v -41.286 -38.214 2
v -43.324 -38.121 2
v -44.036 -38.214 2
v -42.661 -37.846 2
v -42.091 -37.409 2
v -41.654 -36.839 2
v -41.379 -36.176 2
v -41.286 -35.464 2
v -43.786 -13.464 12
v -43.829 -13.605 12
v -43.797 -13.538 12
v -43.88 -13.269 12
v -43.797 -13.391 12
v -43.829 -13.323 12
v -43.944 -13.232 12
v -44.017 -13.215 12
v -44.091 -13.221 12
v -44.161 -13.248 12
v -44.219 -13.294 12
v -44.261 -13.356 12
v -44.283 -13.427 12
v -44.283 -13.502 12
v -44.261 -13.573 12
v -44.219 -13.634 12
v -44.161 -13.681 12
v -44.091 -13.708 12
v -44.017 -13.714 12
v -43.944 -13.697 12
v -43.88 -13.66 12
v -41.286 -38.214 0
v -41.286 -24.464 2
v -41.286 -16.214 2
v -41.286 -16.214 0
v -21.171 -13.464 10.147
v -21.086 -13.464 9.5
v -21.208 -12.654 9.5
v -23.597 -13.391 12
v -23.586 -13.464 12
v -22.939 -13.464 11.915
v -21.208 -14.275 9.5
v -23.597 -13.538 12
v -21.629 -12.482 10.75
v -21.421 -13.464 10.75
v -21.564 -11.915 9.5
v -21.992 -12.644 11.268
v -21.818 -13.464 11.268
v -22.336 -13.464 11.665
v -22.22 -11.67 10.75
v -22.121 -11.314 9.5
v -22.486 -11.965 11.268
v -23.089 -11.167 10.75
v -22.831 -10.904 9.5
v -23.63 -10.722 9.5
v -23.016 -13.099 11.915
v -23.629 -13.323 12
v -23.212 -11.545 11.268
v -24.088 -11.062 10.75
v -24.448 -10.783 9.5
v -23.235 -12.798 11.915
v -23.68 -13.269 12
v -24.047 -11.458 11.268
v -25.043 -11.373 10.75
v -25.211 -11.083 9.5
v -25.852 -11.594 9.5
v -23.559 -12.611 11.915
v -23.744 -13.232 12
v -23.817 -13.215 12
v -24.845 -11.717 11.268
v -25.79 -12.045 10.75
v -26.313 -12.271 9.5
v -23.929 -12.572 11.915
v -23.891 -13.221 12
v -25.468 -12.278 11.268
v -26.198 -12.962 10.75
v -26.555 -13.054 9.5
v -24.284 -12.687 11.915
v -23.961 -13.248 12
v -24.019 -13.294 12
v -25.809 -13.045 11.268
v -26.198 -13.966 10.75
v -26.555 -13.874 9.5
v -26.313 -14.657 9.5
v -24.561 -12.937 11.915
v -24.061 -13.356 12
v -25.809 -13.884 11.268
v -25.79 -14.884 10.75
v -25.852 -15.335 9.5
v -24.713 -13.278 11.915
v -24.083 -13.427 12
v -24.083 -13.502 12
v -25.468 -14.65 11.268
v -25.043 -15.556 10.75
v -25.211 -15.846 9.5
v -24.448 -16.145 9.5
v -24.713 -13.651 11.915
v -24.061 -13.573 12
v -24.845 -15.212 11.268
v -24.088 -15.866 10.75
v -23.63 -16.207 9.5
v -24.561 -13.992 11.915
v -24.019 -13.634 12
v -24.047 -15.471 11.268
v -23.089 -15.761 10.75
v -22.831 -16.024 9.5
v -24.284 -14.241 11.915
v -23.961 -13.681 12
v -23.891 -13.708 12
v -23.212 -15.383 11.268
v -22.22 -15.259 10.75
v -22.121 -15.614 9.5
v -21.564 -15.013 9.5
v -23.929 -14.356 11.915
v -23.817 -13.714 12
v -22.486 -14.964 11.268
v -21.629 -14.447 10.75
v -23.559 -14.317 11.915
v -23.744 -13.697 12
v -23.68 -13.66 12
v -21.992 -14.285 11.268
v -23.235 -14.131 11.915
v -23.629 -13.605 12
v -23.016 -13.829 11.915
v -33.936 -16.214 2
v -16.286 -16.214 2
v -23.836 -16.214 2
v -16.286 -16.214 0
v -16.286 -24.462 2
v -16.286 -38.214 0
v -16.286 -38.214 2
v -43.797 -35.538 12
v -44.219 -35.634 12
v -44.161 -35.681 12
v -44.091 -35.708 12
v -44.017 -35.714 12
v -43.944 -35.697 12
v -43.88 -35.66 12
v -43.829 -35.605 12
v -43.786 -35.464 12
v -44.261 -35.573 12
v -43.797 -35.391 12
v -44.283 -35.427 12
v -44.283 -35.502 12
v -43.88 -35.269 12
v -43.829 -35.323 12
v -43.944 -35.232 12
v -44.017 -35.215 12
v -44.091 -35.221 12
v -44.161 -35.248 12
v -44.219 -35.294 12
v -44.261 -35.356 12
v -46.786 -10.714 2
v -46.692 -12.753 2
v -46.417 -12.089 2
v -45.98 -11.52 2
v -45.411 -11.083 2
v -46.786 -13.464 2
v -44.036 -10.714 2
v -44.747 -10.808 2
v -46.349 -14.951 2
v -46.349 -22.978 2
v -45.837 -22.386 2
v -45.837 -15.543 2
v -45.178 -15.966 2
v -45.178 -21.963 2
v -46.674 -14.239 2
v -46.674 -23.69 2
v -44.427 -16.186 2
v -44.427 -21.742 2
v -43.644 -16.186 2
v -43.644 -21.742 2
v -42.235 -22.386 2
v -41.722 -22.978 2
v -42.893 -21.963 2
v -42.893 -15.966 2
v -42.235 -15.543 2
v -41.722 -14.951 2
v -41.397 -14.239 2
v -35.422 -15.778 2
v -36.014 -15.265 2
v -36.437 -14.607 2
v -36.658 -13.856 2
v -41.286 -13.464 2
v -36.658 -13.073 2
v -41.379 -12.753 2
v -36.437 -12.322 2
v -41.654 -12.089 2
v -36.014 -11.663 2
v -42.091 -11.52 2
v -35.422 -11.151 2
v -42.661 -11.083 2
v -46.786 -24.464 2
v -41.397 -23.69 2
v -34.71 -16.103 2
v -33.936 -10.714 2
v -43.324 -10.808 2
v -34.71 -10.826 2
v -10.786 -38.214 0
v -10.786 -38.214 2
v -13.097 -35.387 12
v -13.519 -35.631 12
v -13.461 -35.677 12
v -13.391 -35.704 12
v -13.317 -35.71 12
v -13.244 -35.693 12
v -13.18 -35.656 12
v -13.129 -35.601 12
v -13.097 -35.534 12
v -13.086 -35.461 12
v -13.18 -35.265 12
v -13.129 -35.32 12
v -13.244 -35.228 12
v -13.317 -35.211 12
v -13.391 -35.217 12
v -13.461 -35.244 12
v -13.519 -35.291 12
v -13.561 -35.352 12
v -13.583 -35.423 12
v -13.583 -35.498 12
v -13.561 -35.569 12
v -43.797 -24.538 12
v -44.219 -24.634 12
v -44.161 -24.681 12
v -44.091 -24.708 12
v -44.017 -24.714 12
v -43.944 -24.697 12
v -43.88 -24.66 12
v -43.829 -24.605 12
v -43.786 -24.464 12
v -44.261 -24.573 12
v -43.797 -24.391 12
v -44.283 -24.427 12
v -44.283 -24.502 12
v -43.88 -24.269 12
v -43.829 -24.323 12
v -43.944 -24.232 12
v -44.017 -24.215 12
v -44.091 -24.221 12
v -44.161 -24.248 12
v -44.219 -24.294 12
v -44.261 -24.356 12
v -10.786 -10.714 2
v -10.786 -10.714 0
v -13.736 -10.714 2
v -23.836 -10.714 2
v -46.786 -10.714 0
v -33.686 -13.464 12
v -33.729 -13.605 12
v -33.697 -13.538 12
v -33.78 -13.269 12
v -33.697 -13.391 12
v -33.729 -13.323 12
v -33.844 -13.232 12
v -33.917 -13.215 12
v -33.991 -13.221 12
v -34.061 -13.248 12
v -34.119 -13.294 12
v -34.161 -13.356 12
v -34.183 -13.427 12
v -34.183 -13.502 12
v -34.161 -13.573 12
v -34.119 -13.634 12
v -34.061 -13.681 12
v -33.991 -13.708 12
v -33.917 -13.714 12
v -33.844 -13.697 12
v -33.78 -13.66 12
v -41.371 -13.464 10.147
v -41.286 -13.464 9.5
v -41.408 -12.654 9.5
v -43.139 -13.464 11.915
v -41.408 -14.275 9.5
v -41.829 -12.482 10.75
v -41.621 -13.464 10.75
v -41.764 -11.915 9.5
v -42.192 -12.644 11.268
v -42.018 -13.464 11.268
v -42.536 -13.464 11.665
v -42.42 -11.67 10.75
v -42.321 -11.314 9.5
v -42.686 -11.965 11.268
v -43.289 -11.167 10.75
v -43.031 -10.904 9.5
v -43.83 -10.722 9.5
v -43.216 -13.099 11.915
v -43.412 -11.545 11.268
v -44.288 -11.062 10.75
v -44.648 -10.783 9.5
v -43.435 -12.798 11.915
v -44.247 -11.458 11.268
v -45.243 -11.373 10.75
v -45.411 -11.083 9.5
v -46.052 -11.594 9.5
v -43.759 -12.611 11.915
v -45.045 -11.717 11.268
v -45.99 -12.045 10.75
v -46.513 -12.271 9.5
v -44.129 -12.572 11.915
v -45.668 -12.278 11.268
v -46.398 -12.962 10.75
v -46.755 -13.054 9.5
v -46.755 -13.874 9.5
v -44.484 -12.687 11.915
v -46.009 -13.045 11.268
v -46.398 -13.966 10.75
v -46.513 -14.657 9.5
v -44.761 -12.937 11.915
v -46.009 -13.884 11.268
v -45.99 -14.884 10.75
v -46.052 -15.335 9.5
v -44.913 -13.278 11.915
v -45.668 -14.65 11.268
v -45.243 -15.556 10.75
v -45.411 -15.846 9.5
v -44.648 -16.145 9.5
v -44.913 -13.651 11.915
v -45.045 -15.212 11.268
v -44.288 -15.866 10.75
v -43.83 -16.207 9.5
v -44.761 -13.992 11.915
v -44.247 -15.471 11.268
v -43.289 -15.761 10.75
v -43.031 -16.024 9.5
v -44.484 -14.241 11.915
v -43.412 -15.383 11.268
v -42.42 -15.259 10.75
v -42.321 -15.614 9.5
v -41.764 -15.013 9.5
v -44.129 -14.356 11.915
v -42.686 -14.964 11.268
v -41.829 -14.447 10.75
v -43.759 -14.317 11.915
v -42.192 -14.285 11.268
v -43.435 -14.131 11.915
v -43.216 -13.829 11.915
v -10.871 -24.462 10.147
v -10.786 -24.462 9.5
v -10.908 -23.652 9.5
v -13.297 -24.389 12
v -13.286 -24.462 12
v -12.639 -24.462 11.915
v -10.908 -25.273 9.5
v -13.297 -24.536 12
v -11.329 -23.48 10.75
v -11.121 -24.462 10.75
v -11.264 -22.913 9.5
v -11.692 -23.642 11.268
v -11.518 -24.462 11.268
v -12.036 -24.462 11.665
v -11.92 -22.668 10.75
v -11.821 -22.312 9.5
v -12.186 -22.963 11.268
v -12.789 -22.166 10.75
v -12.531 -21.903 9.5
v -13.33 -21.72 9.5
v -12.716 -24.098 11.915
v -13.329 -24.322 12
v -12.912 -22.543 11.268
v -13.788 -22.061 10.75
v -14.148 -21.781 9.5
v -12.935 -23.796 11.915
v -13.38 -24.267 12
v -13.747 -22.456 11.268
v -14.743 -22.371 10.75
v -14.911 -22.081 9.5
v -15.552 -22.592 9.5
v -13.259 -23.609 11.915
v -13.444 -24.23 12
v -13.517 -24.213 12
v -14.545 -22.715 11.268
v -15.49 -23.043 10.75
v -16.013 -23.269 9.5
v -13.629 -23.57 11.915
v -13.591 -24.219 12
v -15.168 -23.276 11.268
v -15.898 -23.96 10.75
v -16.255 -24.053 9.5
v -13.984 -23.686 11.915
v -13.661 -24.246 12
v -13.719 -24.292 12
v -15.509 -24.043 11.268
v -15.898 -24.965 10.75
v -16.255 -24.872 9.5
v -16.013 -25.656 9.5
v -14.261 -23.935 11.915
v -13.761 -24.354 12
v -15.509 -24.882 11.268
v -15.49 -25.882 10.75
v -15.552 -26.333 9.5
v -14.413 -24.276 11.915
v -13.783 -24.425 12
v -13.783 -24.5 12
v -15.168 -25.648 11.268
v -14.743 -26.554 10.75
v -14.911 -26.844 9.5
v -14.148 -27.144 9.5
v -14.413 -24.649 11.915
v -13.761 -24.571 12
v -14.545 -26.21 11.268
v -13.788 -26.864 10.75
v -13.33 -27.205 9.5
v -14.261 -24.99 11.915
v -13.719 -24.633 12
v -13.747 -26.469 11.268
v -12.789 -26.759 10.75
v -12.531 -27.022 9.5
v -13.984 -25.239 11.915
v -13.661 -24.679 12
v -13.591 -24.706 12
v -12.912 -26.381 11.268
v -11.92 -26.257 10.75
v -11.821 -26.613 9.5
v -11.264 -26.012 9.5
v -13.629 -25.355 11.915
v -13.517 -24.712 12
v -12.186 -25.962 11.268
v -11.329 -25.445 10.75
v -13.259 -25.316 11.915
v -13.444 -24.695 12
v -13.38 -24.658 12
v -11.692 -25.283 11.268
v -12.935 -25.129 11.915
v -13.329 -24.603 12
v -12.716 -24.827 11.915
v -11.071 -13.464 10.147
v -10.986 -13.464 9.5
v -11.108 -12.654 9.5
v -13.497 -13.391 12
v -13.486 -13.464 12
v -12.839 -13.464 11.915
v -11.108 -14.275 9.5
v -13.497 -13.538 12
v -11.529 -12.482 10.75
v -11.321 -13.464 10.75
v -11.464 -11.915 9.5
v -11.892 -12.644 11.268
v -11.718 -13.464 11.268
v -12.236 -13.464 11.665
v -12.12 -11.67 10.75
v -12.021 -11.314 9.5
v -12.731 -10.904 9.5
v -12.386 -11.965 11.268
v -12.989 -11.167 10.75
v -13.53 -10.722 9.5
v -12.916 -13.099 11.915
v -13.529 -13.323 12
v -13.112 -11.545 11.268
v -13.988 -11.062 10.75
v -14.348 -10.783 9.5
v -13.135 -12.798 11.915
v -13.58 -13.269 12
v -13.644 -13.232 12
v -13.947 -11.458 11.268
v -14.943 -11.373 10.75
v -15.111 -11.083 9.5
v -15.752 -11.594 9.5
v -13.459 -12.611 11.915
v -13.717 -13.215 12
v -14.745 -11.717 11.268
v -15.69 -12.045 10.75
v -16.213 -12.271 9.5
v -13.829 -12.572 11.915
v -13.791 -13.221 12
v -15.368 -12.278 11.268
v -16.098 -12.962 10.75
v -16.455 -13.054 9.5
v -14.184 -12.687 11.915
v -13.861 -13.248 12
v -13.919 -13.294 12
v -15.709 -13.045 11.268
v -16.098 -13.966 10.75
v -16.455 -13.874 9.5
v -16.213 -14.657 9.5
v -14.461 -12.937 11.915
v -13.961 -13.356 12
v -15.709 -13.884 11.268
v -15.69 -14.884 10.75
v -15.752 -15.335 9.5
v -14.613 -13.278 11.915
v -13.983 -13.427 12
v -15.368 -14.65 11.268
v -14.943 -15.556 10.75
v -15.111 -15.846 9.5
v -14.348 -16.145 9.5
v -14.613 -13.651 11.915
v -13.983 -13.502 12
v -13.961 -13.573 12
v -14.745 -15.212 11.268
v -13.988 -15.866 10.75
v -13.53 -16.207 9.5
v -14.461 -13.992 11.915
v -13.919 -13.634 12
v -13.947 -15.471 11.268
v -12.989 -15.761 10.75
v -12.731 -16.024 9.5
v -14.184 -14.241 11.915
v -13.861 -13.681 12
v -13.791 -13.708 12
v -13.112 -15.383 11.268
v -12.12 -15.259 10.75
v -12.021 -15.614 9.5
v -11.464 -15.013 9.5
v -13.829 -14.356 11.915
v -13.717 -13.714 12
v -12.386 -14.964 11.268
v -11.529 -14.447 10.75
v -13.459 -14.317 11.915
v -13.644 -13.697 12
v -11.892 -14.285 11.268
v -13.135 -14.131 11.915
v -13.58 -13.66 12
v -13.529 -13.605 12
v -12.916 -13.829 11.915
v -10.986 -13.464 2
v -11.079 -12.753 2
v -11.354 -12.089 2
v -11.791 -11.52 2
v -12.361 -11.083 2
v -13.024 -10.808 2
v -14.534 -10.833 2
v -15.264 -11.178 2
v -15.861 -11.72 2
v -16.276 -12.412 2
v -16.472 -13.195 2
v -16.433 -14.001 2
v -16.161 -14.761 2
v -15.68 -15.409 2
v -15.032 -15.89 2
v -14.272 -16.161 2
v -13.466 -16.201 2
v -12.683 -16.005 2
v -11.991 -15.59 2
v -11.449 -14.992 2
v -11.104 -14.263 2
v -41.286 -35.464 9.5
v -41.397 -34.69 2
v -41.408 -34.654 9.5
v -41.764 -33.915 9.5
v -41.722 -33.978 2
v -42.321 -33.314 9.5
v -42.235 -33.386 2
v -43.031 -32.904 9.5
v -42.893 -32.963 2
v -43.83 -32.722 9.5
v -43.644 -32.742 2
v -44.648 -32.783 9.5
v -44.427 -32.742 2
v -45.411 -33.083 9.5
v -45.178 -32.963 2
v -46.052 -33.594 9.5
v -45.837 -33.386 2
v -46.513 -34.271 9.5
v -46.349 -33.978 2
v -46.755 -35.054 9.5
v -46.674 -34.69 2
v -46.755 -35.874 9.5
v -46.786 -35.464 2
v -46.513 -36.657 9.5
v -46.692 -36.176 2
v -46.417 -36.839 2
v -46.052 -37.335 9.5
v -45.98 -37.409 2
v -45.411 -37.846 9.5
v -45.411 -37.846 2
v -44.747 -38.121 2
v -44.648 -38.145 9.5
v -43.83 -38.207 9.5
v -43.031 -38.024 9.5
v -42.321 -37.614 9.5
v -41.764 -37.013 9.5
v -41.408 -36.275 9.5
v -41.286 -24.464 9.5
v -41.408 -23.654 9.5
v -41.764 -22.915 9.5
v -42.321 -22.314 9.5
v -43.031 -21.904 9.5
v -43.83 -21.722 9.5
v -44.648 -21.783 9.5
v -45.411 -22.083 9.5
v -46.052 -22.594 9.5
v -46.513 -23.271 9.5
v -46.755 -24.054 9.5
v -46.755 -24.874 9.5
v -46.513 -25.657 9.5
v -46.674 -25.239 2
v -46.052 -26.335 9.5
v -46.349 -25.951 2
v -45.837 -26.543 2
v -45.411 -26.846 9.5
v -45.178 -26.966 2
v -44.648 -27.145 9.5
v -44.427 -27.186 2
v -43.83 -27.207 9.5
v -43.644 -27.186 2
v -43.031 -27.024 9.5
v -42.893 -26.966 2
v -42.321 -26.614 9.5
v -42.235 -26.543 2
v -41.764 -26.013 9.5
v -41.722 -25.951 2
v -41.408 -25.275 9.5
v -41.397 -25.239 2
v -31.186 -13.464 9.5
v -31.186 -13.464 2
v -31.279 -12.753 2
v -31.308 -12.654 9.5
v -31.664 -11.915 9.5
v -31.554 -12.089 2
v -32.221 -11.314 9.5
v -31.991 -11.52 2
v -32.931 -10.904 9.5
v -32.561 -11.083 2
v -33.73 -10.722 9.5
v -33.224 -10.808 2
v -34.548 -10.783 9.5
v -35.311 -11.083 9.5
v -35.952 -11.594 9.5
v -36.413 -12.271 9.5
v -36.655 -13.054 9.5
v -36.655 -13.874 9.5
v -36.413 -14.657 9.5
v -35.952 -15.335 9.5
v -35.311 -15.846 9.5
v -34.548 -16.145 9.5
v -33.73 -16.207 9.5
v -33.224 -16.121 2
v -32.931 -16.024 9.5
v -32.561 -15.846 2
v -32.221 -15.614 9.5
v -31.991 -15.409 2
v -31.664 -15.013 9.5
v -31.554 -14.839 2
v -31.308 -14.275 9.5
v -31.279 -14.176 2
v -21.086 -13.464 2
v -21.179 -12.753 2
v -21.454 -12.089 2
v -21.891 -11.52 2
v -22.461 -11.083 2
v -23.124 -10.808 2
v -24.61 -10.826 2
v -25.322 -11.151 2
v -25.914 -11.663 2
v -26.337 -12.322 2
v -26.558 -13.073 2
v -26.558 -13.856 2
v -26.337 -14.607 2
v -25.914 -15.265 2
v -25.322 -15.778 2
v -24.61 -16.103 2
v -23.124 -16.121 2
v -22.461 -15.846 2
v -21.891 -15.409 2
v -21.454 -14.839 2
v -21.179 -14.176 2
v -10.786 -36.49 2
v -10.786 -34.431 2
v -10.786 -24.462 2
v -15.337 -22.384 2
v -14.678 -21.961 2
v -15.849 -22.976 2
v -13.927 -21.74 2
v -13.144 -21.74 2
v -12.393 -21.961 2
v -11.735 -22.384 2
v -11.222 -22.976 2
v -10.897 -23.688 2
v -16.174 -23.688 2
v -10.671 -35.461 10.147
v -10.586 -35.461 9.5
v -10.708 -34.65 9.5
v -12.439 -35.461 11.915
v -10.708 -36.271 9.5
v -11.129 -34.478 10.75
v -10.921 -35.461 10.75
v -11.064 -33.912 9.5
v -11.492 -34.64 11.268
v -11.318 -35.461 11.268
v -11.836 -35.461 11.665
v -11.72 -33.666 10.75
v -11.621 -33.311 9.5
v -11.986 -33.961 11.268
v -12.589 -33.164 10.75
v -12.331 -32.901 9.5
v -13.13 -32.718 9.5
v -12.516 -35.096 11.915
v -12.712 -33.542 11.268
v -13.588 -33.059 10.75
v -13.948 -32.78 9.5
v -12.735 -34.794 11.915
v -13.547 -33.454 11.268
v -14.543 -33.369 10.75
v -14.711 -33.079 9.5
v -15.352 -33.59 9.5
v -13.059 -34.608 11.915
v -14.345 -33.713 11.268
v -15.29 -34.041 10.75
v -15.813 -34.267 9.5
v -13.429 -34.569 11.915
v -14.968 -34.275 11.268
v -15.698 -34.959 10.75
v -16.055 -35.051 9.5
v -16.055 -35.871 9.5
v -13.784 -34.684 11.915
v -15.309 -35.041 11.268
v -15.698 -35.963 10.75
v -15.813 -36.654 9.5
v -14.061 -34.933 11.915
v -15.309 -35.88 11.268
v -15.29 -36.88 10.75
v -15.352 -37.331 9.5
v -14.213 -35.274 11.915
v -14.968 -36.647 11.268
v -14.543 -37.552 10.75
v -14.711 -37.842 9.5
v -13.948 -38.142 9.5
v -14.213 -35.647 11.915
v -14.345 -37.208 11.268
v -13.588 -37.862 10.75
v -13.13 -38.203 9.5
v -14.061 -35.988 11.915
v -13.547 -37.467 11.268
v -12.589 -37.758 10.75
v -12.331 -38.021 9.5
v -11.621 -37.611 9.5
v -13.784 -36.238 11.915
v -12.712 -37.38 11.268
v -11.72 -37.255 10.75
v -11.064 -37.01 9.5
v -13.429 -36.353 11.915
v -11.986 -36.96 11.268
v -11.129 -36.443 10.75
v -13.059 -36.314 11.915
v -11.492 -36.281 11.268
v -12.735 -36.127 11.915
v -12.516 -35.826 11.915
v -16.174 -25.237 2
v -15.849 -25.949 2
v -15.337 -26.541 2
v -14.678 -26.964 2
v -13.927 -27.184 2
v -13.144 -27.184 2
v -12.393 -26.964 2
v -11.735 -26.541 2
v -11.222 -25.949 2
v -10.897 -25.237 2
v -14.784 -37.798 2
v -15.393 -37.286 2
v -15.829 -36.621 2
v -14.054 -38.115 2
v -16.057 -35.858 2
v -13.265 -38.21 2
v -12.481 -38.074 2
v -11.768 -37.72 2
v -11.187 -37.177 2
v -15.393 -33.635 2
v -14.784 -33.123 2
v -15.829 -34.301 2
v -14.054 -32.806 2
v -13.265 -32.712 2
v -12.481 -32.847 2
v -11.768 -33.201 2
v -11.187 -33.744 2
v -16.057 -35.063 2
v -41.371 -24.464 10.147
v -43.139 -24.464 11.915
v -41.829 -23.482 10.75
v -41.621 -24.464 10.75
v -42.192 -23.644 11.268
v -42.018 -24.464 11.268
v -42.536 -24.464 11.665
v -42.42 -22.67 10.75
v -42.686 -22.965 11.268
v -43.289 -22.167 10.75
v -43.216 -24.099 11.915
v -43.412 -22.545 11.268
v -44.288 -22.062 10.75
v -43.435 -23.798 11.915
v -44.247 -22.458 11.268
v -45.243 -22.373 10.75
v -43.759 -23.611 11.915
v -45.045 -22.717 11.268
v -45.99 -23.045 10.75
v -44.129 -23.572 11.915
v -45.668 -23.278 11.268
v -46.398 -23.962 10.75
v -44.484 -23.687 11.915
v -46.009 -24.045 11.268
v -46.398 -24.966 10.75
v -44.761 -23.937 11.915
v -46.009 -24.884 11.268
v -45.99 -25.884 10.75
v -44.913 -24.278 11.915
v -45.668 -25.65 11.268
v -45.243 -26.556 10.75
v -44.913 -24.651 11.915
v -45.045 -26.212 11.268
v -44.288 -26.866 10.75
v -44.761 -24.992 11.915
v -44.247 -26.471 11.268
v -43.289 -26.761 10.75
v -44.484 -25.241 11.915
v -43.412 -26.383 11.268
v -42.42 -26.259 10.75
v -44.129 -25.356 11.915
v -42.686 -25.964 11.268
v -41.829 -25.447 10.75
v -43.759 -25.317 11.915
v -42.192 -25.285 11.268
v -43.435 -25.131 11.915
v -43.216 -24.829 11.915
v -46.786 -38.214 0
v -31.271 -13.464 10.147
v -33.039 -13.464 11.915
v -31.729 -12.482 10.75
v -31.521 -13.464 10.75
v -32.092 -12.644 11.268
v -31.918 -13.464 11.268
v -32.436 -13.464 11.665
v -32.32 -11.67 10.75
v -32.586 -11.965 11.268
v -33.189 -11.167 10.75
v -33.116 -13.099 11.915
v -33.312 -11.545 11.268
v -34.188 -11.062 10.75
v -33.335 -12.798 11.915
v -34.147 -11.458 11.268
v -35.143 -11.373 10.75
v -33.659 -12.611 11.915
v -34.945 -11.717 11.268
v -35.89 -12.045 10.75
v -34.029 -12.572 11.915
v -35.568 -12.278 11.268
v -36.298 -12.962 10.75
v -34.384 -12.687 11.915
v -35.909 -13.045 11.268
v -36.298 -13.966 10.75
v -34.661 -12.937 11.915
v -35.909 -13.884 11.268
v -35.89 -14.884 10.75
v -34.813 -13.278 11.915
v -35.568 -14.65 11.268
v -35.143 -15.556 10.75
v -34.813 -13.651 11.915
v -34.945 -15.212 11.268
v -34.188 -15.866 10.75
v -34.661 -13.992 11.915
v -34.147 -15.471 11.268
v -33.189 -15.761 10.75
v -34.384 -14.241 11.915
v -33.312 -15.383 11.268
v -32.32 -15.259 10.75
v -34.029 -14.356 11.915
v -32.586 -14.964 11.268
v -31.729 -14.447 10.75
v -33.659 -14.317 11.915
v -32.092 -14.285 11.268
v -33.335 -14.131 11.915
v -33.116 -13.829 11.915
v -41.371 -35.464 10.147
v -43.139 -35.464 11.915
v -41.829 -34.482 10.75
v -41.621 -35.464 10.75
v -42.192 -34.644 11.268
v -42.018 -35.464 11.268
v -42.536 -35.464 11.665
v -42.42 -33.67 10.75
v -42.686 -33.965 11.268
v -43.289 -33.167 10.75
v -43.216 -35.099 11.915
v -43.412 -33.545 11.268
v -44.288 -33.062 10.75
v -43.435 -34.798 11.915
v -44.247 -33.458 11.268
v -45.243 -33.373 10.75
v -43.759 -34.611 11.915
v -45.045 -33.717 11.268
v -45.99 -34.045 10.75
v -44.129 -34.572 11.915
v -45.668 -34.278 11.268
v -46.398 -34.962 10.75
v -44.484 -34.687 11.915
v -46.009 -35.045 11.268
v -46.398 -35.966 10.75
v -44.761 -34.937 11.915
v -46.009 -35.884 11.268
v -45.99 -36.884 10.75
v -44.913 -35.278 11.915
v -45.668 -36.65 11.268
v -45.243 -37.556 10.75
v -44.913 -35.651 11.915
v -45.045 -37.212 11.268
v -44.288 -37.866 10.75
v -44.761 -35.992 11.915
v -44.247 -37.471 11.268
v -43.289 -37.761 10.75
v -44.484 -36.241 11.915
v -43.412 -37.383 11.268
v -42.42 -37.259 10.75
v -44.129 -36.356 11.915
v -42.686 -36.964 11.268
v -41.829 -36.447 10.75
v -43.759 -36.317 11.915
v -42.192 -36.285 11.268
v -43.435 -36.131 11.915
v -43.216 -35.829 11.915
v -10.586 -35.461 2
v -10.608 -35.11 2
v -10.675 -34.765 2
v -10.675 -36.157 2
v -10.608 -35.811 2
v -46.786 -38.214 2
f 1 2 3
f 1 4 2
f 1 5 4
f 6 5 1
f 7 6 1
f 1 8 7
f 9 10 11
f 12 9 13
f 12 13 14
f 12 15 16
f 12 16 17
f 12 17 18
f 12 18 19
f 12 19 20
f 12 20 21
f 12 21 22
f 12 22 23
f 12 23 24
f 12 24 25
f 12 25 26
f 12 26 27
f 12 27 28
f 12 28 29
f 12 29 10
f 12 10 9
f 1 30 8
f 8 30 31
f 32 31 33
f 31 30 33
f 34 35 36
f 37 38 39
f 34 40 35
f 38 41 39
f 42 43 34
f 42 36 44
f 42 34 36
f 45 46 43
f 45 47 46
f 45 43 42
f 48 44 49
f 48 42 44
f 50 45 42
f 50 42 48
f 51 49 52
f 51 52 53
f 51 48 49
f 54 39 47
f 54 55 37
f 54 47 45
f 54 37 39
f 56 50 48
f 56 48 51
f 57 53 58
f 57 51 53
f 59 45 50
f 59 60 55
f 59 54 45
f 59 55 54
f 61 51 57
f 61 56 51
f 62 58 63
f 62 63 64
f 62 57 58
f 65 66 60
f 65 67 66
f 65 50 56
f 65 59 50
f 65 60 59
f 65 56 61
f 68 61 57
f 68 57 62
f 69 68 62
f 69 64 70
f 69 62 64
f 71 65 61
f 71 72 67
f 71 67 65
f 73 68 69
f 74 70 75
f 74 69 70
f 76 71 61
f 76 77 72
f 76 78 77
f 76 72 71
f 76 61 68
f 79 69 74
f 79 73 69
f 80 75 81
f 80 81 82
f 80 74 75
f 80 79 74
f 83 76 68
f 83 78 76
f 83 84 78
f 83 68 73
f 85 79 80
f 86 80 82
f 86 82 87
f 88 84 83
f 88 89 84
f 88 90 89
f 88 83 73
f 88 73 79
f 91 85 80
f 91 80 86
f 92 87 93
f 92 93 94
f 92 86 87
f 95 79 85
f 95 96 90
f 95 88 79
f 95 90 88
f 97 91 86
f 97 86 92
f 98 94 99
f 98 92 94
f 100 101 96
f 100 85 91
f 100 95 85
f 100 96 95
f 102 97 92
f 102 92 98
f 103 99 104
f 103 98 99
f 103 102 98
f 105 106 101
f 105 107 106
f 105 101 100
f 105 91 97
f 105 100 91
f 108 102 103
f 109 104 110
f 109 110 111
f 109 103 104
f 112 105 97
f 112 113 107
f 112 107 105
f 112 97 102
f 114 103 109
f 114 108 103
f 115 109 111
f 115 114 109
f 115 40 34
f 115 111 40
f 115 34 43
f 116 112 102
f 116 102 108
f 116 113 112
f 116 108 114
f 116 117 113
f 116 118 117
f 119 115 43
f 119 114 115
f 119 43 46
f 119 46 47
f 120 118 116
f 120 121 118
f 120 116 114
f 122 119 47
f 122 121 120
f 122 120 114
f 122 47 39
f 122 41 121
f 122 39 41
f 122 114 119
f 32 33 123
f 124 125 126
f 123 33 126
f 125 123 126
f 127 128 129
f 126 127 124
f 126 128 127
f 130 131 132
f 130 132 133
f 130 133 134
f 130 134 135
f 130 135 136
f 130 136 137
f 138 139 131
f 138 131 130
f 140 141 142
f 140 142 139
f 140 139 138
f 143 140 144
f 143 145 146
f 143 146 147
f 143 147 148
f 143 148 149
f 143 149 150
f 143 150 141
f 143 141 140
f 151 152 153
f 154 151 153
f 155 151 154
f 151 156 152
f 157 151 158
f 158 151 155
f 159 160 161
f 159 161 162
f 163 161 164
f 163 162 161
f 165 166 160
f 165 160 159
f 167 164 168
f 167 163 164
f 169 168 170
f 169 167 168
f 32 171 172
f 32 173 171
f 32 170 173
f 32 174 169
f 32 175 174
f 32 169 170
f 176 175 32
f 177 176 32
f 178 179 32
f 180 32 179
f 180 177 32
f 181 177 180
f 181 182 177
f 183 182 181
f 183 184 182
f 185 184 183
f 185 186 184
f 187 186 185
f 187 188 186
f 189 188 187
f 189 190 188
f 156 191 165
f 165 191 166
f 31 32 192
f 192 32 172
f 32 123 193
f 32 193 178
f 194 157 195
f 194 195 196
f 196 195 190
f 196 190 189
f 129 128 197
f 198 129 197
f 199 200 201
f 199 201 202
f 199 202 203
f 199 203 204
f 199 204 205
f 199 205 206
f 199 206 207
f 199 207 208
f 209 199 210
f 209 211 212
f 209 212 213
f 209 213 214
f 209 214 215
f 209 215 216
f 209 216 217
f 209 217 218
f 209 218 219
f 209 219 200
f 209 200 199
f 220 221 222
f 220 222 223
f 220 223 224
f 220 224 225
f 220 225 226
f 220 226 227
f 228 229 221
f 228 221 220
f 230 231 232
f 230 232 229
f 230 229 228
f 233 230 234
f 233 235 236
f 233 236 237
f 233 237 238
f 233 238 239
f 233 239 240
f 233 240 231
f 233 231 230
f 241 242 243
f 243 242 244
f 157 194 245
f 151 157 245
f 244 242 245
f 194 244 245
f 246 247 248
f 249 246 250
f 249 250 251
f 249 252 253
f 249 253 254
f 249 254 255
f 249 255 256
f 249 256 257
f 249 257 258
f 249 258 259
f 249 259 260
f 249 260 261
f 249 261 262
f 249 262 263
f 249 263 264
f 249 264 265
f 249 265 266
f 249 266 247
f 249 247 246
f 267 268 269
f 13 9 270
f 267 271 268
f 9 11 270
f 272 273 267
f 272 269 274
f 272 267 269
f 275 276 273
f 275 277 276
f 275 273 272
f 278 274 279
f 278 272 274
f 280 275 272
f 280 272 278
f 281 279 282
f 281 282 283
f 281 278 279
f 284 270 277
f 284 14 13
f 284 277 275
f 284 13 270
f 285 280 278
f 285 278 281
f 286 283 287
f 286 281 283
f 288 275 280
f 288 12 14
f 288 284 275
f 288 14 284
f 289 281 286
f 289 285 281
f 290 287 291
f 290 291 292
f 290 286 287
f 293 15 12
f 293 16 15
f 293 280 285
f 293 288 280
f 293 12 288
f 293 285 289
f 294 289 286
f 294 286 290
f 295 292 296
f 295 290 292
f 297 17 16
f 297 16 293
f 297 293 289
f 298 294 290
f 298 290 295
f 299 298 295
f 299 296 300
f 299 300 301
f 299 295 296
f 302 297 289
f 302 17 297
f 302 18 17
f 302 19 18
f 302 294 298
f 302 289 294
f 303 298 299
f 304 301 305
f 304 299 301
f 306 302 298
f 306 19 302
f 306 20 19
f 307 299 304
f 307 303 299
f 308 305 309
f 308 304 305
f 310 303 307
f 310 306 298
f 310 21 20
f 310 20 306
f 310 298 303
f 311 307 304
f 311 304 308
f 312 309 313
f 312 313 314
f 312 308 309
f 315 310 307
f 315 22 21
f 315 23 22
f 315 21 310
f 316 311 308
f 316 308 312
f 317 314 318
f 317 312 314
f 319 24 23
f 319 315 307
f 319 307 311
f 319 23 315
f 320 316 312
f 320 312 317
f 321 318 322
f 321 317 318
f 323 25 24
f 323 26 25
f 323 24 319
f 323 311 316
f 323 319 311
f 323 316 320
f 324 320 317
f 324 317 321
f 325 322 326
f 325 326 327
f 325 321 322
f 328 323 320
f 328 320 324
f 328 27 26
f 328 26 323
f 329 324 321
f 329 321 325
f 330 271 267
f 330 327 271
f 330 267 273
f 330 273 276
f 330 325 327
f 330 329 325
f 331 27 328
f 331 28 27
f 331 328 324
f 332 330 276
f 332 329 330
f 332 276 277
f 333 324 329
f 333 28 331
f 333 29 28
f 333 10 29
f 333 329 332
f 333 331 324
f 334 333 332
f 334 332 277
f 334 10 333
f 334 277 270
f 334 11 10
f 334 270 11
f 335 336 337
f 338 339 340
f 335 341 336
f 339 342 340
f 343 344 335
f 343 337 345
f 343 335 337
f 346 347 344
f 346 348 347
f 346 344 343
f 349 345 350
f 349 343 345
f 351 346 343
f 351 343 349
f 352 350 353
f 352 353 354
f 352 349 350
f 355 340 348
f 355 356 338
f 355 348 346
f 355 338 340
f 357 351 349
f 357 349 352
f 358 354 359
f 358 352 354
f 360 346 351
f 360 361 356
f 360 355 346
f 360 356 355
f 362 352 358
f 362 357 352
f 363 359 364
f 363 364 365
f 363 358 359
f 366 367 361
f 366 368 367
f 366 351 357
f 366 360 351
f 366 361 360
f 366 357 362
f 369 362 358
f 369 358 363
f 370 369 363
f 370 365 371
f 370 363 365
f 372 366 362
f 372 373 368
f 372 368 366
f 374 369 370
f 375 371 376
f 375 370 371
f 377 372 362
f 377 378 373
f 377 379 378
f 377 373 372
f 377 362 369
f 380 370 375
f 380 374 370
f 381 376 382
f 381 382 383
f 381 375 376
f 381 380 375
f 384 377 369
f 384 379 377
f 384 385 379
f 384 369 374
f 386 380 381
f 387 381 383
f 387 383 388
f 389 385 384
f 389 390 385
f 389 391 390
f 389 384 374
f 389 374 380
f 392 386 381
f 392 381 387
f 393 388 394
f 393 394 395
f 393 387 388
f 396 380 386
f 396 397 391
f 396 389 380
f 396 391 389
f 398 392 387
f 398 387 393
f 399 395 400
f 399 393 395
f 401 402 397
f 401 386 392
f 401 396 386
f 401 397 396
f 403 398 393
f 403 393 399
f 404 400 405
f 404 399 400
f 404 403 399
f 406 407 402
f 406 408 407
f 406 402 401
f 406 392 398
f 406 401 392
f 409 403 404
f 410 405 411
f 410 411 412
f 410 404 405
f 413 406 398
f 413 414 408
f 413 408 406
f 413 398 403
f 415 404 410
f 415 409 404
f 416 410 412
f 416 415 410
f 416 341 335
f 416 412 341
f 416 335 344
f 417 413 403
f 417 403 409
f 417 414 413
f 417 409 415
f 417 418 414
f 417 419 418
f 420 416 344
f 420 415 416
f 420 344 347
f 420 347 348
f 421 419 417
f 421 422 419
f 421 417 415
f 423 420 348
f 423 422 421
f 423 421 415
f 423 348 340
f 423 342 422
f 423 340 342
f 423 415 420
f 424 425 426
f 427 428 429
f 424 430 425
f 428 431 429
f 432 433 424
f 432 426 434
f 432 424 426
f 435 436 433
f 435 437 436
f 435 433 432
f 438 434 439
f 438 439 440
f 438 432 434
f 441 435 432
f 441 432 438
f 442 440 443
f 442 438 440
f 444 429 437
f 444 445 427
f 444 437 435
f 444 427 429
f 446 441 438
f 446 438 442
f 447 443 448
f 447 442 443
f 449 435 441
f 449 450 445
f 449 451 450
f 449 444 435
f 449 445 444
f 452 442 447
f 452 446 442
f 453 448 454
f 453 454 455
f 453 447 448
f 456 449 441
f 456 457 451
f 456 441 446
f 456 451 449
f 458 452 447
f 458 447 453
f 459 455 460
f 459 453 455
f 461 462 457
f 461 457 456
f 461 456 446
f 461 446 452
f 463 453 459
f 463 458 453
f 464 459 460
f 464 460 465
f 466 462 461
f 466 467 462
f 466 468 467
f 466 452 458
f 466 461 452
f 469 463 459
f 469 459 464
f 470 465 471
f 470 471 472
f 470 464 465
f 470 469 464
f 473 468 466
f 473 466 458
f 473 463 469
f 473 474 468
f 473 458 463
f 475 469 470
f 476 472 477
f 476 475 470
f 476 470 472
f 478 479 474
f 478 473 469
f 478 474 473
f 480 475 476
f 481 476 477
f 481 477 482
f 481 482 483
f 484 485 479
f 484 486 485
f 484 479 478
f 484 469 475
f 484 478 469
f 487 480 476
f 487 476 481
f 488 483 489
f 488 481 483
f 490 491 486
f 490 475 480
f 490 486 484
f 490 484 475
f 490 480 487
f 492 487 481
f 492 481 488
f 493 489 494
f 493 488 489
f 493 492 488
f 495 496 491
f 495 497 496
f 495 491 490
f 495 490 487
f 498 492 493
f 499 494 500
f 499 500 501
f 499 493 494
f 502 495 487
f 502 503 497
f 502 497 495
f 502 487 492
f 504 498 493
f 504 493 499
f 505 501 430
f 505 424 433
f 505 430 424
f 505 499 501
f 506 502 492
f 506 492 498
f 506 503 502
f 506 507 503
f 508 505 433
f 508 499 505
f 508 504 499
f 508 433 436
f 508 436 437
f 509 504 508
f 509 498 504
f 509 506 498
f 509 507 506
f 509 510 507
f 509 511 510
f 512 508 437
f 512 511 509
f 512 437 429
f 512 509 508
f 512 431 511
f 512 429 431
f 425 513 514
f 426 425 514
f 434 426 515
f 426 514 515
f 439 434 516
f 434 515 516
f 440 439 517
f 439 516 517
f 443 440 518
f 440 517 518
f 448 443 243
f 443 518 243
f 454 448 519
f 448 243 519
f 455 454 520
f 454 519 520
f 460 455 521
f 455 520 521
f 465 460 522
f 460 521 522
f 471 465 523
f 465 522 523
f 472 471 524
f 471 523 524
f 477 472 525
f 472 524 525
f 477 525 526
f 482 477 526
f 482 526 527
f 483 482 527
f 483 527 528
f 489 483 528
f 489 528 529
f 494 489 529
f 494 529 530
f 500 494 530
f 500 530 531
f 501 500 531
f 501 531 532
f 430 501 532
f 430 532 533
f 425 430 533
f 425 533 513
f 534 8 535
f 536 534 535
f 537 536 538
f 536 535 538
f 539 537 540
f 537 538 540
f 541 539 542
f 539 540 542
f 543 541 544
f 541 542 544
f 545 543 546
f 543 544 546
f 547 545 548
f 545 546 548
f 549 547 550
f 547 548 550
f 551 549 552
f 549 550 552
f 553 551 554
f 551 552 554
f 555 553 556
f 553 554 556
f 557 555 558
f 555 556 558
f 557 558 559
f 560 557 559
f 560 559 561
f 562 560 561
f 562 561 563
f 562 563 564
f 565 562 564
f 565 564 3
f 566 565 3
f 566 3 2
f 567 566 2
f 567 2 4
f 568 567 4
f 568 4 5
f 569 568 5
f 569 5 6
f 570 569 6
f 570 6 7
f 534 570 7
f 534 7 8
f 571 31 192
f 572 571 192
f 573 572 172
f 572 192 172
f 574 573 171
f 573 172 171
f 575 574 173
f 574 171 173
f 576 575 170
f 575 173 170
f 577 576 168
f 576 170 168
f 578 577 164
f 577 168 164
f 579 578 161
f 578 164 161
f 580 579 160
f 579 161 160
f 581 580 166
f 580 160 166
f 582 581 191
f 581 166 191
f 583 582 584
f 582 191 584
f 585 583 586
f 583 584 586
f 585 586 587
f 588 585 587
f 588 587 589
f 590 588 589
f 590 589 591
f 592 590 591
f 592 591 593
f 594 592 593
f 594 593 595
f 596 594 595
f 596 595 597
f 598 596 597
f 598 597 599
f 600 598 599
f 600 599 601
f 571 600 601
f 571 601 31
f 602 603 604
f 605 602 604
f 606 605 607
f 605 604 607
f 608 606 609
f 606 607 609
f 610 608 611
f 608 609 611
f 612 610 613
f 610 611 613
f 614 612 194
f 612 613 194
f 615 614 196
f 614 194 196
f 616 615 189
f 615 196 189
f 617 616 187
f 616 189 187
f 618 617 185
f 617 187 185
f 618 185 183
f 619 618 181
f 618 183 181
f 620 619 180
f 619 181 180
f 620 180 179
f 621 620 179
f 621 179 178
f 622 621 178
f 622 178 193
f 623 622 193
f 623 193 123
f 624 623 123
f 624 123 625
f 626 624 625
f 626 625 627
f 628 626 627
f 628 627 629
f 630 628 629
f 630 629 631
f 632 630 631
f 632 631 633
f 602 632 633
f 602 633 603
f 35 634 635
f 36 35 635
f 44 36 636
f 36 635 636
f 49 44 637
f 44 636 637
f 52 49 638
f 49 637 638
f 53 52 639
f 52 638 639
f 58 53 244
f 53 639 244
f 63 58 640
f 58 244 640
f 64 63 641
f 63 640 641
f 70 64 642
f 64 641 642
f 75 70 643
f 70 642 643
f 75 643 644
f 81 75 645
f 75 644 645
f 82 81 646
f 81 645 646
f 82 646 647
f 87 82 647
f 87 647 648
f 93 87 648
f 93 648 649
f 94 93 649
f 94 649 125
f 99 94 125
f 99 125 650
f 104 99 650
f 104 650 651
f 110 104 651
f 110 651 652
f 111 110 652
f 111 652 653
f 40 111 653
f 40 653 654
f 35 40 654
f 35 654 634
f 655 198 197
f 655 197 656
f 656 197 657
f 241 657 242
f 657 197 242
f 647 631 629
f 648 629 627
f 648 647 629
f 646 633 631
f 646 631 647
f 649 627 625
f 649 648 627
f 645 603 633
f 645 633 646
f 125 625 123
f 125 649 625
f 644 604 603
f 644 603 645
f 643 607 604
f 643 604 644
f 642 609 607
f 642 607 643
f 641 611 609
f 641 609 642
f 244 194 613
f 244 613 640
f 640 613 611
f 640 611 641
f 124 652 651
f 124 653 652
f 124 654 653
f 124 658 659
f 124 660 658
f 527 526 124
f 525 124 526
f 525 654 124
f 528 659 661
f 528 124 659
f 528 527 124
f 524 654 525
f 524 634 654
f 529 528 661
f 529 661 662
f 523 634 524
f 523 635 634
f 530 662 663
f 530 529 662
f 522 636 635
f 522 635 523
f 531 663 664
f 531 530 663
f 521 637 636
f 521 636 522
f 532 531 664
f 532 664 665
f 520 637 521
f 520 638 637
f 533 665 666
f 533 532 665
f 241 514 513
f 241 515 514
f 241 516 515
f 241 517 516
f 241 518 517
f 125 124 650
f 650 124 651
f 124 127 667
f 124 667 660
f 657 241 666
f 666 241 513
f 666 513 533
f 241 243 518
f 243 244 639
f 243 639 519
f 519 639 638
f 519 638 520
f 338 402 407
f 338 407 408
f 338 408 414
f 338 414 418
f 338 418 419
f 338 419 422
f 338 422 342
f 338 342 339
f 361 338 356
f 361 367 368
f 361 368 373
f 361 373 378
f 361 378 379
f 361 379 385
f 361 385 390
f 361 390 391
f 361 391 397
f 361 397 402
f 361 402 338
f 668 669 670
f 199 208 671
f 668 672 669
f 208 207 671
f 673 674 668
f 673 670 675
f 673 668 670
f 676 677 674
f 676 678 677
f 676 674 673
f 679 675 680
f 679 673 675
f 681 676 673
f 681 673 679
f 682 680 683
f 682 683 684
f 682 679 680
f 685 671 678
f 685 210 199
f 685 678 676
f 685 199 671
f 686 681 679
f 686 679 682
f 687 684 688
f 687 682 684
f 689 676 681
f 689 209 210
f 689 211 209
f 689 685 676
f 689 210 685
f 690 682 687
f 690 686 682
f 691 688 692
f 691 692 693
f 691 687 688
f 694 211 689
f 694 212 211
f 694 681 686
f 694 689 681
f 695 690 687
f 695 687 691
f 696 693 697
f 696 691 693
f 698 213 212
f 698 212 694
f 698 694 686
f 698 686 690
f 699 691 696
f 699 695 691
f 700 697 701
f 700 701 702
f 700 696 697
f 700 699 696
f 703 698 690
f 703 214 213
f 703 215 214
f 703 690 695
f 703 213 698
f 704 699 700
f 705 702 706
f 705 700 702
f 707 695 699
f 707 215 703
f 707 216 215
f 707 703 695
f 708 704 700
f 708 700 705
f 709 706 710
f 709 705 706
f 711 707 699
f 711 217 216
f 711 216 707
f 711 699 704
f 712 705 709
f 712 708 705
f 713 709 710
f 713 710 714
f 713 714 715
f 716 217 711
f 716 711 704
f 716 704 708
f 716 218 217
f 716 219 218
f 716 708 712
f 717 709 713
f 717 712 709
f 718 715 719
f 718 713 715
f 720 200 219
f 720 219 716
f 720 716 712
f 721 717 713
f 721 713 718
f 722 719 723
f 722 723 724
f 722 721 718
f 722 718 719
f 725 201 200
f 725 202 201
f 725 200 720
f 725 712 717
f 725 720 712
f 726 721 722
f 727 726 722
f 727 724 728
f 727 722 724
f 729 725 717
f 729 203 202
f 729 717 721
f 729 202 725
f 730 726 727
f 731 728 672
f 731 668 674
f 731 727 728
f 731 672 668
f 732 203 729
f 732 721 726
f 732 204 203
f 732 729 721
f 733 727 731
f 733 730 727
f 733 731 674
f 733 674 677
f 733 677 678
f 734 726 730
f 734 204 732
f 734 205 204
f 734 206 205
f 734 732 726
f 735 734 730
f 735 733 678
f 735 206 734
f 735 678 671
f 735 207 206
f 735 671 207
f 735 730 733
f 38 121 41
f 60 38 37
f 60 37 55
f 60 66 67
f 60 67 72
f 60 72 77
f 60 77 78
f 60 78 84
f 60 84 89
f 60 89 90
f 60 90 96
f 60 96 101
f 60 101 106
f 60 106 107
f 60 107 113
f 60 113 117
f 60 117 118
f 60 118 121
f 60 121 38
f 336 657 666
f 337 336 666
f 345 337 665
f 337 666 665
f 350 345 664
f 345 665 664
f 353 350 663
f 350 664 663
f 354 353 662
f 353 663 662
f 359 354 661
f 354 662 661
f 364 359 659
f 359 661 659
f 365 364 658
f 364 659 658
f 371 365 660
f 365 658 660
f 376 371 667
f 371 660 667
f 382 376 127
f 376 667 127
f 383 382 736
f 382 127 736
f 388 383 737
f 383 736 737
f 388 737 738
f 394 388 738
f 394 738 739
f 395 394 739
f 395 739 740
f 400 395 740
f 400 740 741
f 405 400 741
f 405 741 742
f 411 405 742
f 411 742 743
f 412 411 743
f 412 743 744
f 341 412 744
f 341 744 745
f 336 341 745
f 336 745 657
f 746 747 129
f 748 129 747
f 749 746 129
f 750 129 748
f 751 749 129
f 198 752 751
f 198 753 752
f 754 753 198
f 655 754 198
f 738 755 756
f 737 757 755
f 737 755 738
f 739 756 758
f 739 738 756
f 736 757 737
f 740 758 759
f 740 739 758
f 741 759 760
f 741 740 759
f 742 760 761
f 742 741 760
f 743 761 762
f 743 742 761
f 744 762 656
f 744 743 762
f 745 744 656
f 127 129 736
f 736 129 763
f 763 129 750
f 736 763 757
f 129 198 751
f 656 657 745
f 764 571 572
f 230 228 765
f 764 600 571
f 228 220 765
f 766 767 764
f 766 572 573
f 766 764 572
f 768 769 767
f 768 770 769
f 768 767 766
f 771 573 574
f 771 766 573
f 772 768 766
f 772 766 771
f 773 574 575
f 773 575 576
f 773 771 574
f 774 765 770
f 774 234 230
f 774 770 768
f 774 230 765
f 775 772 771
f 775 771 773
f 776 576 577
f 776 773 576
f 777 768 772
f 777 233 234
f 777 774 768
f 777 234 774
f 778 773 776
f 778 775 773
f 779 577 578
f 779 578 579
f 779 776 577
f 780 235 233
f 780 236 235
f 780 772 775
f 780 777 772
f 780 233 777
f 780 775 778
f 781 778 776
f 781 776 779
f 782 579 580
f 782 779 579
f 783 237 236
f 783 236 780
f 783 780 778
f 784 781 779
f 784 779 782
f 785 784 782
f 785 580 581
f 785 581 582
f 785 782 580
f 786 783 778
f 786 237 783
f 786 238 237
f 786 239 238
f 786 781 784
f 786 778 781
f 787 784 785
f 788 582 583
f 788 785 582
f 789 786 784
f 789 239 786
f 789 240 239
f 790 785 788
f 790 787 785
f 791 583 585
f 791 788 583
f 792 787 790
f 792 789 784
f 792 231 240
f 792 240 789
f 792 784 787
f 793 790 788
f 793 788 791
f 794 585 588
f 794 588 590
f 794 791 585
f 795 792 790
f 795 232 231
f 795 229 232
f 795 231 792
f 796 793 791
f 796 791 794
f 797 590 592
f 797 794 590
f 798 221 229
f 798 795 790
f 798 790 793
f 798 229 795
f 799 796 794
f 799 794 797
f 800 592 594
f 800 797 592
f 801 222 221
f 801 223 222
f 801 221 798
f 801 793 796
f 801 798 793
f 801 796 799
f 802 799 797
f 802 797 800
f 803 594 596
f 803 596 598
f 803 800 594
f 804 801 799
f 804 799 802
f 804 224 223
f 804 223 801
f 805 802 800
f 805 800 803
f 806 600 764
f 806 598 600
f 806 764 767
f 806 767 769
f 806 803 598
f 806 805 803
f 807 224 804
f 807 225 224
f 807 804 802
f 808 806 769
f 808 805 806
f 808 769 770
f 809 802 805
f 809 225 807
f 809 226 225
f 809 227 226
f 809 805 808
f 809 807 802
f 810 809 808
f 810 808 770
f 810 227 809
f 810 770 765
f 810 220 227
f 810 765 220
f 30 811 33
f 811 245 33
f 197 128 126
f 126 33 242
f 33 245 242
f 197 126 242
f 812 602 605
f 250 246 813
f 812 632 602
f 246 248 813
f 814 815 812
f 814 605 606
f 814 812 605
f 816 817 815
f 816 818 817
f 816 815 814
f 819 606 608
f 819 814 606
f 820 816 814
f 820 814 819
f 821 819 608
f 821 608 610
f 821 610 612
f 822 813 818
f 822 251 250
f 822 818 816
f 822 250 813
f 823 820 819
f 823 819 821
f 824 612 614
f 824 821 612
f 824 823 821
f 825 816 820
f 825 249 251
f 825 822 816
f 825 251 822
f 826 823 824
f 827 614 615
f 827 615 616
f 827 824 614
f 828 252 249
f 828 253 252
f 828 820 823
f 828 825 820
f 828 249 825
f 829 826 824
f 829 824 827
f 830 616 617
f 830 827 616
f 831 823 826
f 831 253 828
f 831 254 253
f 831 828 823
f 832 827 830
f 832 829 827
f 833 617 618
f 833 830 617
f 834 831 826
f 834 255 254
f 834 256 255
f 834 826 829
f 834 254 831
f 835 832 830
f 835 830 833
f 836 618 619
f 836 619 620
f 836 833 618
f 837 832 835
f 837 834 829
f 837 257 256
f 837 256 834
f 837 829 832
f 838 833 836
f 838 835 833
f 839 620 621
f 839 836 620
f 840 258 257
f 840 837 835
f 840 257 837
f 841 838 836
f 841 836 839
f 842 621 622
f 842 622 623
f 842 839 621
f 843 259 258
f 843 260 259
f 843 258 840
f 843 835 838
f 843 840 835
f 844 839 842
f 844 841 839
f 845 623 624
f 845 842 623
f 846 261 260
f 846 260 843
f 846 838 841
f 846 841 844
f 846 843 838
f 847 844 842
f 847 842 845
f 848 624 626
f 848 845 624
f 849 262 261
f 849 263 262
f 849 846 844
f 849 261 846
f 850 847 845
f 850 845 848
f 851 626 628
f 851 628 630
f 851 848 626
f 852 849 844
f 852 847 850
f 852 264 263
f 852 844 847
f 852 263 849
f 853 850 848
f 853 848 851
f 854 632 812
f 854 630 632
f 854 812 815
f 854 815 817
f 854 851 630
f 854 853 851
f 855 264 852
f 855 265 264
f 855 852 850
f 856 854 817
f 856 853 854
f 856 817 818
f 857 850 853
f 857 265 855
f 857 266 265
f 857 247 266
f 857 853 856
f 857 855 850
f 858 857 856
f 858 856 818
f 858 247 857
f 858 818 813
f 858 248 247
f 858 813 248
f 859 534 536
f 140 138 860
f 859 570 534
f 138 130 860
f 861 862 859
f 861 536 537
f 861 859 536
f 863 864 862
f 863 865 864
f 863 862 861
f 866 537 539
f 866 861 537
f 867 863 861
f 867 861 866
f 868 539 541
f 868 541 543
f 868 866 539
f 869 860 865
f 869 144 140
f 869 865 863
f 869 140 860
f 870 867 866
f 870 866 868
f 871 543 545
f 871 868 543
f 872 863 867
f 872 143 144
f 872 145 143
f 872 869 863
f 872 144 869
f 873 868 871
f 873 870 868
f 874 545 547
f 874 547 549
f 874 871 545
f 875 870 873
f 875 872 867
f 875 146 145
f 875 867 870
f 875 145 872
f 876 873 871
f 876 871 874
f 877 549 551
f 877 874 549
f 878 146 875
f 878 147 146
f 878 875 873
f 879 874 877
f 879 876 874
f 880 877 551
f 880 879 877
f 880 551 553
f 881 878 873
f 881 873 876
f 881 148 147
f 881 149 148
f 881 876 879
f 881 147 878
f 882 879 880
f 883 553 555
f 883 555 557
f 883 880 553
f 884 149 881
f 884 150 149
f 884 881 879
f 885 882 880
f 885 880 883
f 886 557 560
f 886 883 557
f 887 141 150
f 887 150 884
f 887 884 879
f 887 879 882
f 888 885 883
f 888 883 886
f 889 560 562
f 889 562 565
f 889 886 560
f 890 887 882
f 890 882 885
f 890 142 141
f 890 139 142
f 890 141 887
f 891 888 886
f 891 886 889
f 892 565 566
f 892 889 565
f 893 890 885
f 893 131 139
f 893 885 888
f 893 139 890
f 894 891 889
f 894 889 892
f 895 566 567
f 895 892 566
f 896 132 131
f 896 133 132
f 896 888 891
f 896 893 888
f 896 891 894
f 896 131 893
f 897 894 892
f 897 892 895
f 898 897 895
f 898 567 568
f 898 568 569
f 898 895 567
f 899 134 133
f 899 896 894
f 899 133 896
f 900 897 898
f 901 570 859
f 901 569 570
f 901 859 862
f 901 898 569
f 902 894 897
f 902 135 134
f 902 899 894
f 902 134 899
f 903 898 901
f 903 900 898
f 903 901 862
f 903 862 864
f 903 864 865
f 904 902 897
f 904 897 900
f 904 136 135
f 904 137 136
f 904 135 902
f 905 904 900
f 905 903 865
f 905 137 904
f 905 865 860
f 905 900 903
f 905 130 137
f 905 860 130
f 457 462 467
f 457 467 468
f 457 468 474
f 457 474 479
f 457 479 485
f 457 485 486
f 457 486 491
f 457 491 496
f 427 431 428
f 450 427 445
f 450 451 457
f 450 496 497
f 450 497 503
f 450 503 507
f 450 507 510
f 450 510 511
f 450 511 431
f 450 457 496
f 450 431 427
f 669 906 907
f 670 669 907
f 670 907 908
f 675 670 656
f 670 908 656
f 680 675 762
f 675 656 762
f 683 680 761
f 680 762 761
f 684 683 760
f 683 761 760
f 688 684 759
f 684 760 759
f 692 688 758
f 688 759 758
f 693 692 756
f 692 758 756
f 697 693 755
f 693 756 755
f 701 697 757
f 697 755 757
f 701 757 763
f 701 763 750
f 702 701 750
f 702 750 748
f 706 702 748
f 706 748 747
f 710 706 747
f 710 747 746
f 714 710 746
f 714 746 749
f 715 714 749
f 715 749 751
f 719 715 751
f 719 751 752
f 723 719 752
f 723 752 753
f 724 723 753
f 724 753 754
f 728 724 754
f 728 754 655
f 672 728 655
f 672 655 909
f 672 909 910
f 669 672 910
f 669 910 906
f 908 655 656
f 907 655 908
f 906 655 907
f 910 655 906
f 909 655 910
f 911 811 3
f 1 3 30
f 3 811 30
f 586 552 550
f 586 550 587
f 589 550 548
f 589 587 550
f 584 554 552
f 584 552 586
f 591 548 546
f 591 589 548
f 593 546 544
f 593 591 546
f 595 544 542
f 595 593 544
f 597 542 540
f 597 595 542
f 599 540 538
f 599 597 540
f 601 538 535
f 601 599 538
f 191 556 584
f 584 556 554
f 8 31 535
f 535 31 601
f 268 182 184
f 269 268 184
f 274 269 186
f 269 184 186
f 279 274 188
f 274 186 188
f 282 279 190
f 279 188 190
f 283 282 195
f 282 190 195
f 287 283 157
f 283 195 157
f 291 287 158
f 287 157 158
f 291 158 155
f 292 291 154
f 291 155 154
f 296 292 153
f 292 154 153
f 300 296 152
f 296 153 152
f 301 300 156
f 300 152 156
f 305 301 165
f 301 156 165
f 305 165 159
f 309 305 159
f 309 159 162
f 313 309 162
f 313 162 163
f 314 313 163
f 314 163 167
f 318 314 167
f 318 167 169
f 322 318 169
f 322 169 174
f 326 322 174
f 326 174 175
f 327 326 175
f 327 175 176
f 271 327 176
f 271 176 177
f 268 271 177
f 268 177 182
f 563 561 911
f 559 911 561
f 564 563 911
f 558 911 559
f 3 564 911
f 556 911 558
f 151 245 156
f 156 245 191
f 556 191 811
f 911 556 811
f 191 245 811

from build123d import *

# Parameters (mm, degrees)
F0_W     = 5.5
F0_H     = 22
F1_DEPTH = 2
F2_R     = 2.75
F3_DEPTH = 10
F4_R     = 2.5
F5_R     = 2.5


with BuildPart() as f1:
    # F0 (on Top) → F1 (new body)
    with BuildSketch(Plane.XY):
        with Locations((-44.035716, -27.214289)):
            Rectangle(F0_W, F0_H)
        Polygon((-46.785716, -10.714289), (-46.785716, -16.214289), (-41.285716, -16.214289), (-16.285716, -16.214289), (-10.785716, -16.214289), (-10.785716, -10.714289), align=None)
        with Locations((-13.535716, -27.214289)):
            Rectangle(F0_W, F0_H)
    extrude(amount=F1_DEPTH)

    # F2 (on face) → F3 (join)
    with BuildSketch(Plane.XY.offset(2)):
        with Locations((-44.035716, -35.464289)):
            Circle(F2_R)
        with Locations((-44.035716, -24.464289)):
            Circle(F2_R)
        with Locations((-44.035716, -13.464289)):
            Circle(F2_R)
        with Locations((-33.935716, -13.464289)):
            Circle(F2_R)
        with Locations((-23.835716, -13.464289)):
            Circle(F2_R)
        with Locations((-13.735716, -13.464289)):
            Circle(F2_R)
        with Locations((-13.535716, -24.46247)):
            Circle(F2_R)
        with Locations((-13.335716, -35.460652)):
            Circle(F2_R)
    extrude(amount=F3_DEPTH)

    # F4
    f4_edges = [f1.edges().sort_by_distance(p)[0] for p in [
        (-46.785716, -35.464289, 12),
    ]]
    fillet(f4_edges, radius=F4_R)

    # F5
    f5_edges = [f1.edges().sort_by_distance(p)[0] for p in [
        (-46.785716, -24.464289, 12),
        (-46.785716, -13.464289, 12),
        (-36.685716, -13.464289, 12),
        (-26.585716, -13.464289, 12),
        (-16.485716, -13.464289, 12),
        (-16.285716, -24.46247, 12),
        (-16.085716, -35.460652, 12),
    ]]
    fillet(f5_edges, radius=F5_R)


solid = f1.part
